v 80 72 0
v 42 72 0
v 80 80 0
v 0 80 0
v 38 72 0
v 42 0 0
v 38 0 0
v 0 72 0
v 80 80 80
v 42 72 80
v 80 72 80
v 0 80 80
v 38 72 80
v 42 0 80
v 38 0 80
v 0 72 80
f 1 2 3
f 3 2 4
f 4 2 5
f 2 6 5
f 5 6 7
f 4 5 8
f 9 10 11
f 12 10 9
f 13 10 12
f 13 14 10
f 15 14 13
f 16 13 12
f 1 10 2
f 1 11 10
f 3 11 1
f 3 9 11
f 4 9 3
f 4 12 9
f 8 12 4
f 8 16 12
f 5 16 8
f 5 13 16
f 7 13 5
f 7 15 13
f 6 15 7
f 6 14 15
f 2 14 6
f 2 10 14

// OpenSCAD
$fn = 32;

// ----------------------------------------------------------------------
// Structural section: tee 80 x 80 mm
// ----------------------------------------------------------------------

// --- parameters (mm) ---
sec_w = 80;               // tee width, X
sec_h = 80;               // tee height, Y
flange_t = 8;             // top flange thickness
web_t = 4;                // web thickness
plate_t = 80;             // cut length, Z (extrusion height)
fit_tol = 0.1;            // declared fit tolerance (prompt contract)
free_tol = 0.5;           // declared free tolerance (prompt contract)

profile = [[38, 0], [42, 0], [42, 72], [80, 72], [80, 80], [0, 80], [0, 72], [38, 72]];  // primary outline, 8 points, counter clockwise

// --- the one profile operation ---
linear_extrude(height = plate_t) polygon(points = profile);
